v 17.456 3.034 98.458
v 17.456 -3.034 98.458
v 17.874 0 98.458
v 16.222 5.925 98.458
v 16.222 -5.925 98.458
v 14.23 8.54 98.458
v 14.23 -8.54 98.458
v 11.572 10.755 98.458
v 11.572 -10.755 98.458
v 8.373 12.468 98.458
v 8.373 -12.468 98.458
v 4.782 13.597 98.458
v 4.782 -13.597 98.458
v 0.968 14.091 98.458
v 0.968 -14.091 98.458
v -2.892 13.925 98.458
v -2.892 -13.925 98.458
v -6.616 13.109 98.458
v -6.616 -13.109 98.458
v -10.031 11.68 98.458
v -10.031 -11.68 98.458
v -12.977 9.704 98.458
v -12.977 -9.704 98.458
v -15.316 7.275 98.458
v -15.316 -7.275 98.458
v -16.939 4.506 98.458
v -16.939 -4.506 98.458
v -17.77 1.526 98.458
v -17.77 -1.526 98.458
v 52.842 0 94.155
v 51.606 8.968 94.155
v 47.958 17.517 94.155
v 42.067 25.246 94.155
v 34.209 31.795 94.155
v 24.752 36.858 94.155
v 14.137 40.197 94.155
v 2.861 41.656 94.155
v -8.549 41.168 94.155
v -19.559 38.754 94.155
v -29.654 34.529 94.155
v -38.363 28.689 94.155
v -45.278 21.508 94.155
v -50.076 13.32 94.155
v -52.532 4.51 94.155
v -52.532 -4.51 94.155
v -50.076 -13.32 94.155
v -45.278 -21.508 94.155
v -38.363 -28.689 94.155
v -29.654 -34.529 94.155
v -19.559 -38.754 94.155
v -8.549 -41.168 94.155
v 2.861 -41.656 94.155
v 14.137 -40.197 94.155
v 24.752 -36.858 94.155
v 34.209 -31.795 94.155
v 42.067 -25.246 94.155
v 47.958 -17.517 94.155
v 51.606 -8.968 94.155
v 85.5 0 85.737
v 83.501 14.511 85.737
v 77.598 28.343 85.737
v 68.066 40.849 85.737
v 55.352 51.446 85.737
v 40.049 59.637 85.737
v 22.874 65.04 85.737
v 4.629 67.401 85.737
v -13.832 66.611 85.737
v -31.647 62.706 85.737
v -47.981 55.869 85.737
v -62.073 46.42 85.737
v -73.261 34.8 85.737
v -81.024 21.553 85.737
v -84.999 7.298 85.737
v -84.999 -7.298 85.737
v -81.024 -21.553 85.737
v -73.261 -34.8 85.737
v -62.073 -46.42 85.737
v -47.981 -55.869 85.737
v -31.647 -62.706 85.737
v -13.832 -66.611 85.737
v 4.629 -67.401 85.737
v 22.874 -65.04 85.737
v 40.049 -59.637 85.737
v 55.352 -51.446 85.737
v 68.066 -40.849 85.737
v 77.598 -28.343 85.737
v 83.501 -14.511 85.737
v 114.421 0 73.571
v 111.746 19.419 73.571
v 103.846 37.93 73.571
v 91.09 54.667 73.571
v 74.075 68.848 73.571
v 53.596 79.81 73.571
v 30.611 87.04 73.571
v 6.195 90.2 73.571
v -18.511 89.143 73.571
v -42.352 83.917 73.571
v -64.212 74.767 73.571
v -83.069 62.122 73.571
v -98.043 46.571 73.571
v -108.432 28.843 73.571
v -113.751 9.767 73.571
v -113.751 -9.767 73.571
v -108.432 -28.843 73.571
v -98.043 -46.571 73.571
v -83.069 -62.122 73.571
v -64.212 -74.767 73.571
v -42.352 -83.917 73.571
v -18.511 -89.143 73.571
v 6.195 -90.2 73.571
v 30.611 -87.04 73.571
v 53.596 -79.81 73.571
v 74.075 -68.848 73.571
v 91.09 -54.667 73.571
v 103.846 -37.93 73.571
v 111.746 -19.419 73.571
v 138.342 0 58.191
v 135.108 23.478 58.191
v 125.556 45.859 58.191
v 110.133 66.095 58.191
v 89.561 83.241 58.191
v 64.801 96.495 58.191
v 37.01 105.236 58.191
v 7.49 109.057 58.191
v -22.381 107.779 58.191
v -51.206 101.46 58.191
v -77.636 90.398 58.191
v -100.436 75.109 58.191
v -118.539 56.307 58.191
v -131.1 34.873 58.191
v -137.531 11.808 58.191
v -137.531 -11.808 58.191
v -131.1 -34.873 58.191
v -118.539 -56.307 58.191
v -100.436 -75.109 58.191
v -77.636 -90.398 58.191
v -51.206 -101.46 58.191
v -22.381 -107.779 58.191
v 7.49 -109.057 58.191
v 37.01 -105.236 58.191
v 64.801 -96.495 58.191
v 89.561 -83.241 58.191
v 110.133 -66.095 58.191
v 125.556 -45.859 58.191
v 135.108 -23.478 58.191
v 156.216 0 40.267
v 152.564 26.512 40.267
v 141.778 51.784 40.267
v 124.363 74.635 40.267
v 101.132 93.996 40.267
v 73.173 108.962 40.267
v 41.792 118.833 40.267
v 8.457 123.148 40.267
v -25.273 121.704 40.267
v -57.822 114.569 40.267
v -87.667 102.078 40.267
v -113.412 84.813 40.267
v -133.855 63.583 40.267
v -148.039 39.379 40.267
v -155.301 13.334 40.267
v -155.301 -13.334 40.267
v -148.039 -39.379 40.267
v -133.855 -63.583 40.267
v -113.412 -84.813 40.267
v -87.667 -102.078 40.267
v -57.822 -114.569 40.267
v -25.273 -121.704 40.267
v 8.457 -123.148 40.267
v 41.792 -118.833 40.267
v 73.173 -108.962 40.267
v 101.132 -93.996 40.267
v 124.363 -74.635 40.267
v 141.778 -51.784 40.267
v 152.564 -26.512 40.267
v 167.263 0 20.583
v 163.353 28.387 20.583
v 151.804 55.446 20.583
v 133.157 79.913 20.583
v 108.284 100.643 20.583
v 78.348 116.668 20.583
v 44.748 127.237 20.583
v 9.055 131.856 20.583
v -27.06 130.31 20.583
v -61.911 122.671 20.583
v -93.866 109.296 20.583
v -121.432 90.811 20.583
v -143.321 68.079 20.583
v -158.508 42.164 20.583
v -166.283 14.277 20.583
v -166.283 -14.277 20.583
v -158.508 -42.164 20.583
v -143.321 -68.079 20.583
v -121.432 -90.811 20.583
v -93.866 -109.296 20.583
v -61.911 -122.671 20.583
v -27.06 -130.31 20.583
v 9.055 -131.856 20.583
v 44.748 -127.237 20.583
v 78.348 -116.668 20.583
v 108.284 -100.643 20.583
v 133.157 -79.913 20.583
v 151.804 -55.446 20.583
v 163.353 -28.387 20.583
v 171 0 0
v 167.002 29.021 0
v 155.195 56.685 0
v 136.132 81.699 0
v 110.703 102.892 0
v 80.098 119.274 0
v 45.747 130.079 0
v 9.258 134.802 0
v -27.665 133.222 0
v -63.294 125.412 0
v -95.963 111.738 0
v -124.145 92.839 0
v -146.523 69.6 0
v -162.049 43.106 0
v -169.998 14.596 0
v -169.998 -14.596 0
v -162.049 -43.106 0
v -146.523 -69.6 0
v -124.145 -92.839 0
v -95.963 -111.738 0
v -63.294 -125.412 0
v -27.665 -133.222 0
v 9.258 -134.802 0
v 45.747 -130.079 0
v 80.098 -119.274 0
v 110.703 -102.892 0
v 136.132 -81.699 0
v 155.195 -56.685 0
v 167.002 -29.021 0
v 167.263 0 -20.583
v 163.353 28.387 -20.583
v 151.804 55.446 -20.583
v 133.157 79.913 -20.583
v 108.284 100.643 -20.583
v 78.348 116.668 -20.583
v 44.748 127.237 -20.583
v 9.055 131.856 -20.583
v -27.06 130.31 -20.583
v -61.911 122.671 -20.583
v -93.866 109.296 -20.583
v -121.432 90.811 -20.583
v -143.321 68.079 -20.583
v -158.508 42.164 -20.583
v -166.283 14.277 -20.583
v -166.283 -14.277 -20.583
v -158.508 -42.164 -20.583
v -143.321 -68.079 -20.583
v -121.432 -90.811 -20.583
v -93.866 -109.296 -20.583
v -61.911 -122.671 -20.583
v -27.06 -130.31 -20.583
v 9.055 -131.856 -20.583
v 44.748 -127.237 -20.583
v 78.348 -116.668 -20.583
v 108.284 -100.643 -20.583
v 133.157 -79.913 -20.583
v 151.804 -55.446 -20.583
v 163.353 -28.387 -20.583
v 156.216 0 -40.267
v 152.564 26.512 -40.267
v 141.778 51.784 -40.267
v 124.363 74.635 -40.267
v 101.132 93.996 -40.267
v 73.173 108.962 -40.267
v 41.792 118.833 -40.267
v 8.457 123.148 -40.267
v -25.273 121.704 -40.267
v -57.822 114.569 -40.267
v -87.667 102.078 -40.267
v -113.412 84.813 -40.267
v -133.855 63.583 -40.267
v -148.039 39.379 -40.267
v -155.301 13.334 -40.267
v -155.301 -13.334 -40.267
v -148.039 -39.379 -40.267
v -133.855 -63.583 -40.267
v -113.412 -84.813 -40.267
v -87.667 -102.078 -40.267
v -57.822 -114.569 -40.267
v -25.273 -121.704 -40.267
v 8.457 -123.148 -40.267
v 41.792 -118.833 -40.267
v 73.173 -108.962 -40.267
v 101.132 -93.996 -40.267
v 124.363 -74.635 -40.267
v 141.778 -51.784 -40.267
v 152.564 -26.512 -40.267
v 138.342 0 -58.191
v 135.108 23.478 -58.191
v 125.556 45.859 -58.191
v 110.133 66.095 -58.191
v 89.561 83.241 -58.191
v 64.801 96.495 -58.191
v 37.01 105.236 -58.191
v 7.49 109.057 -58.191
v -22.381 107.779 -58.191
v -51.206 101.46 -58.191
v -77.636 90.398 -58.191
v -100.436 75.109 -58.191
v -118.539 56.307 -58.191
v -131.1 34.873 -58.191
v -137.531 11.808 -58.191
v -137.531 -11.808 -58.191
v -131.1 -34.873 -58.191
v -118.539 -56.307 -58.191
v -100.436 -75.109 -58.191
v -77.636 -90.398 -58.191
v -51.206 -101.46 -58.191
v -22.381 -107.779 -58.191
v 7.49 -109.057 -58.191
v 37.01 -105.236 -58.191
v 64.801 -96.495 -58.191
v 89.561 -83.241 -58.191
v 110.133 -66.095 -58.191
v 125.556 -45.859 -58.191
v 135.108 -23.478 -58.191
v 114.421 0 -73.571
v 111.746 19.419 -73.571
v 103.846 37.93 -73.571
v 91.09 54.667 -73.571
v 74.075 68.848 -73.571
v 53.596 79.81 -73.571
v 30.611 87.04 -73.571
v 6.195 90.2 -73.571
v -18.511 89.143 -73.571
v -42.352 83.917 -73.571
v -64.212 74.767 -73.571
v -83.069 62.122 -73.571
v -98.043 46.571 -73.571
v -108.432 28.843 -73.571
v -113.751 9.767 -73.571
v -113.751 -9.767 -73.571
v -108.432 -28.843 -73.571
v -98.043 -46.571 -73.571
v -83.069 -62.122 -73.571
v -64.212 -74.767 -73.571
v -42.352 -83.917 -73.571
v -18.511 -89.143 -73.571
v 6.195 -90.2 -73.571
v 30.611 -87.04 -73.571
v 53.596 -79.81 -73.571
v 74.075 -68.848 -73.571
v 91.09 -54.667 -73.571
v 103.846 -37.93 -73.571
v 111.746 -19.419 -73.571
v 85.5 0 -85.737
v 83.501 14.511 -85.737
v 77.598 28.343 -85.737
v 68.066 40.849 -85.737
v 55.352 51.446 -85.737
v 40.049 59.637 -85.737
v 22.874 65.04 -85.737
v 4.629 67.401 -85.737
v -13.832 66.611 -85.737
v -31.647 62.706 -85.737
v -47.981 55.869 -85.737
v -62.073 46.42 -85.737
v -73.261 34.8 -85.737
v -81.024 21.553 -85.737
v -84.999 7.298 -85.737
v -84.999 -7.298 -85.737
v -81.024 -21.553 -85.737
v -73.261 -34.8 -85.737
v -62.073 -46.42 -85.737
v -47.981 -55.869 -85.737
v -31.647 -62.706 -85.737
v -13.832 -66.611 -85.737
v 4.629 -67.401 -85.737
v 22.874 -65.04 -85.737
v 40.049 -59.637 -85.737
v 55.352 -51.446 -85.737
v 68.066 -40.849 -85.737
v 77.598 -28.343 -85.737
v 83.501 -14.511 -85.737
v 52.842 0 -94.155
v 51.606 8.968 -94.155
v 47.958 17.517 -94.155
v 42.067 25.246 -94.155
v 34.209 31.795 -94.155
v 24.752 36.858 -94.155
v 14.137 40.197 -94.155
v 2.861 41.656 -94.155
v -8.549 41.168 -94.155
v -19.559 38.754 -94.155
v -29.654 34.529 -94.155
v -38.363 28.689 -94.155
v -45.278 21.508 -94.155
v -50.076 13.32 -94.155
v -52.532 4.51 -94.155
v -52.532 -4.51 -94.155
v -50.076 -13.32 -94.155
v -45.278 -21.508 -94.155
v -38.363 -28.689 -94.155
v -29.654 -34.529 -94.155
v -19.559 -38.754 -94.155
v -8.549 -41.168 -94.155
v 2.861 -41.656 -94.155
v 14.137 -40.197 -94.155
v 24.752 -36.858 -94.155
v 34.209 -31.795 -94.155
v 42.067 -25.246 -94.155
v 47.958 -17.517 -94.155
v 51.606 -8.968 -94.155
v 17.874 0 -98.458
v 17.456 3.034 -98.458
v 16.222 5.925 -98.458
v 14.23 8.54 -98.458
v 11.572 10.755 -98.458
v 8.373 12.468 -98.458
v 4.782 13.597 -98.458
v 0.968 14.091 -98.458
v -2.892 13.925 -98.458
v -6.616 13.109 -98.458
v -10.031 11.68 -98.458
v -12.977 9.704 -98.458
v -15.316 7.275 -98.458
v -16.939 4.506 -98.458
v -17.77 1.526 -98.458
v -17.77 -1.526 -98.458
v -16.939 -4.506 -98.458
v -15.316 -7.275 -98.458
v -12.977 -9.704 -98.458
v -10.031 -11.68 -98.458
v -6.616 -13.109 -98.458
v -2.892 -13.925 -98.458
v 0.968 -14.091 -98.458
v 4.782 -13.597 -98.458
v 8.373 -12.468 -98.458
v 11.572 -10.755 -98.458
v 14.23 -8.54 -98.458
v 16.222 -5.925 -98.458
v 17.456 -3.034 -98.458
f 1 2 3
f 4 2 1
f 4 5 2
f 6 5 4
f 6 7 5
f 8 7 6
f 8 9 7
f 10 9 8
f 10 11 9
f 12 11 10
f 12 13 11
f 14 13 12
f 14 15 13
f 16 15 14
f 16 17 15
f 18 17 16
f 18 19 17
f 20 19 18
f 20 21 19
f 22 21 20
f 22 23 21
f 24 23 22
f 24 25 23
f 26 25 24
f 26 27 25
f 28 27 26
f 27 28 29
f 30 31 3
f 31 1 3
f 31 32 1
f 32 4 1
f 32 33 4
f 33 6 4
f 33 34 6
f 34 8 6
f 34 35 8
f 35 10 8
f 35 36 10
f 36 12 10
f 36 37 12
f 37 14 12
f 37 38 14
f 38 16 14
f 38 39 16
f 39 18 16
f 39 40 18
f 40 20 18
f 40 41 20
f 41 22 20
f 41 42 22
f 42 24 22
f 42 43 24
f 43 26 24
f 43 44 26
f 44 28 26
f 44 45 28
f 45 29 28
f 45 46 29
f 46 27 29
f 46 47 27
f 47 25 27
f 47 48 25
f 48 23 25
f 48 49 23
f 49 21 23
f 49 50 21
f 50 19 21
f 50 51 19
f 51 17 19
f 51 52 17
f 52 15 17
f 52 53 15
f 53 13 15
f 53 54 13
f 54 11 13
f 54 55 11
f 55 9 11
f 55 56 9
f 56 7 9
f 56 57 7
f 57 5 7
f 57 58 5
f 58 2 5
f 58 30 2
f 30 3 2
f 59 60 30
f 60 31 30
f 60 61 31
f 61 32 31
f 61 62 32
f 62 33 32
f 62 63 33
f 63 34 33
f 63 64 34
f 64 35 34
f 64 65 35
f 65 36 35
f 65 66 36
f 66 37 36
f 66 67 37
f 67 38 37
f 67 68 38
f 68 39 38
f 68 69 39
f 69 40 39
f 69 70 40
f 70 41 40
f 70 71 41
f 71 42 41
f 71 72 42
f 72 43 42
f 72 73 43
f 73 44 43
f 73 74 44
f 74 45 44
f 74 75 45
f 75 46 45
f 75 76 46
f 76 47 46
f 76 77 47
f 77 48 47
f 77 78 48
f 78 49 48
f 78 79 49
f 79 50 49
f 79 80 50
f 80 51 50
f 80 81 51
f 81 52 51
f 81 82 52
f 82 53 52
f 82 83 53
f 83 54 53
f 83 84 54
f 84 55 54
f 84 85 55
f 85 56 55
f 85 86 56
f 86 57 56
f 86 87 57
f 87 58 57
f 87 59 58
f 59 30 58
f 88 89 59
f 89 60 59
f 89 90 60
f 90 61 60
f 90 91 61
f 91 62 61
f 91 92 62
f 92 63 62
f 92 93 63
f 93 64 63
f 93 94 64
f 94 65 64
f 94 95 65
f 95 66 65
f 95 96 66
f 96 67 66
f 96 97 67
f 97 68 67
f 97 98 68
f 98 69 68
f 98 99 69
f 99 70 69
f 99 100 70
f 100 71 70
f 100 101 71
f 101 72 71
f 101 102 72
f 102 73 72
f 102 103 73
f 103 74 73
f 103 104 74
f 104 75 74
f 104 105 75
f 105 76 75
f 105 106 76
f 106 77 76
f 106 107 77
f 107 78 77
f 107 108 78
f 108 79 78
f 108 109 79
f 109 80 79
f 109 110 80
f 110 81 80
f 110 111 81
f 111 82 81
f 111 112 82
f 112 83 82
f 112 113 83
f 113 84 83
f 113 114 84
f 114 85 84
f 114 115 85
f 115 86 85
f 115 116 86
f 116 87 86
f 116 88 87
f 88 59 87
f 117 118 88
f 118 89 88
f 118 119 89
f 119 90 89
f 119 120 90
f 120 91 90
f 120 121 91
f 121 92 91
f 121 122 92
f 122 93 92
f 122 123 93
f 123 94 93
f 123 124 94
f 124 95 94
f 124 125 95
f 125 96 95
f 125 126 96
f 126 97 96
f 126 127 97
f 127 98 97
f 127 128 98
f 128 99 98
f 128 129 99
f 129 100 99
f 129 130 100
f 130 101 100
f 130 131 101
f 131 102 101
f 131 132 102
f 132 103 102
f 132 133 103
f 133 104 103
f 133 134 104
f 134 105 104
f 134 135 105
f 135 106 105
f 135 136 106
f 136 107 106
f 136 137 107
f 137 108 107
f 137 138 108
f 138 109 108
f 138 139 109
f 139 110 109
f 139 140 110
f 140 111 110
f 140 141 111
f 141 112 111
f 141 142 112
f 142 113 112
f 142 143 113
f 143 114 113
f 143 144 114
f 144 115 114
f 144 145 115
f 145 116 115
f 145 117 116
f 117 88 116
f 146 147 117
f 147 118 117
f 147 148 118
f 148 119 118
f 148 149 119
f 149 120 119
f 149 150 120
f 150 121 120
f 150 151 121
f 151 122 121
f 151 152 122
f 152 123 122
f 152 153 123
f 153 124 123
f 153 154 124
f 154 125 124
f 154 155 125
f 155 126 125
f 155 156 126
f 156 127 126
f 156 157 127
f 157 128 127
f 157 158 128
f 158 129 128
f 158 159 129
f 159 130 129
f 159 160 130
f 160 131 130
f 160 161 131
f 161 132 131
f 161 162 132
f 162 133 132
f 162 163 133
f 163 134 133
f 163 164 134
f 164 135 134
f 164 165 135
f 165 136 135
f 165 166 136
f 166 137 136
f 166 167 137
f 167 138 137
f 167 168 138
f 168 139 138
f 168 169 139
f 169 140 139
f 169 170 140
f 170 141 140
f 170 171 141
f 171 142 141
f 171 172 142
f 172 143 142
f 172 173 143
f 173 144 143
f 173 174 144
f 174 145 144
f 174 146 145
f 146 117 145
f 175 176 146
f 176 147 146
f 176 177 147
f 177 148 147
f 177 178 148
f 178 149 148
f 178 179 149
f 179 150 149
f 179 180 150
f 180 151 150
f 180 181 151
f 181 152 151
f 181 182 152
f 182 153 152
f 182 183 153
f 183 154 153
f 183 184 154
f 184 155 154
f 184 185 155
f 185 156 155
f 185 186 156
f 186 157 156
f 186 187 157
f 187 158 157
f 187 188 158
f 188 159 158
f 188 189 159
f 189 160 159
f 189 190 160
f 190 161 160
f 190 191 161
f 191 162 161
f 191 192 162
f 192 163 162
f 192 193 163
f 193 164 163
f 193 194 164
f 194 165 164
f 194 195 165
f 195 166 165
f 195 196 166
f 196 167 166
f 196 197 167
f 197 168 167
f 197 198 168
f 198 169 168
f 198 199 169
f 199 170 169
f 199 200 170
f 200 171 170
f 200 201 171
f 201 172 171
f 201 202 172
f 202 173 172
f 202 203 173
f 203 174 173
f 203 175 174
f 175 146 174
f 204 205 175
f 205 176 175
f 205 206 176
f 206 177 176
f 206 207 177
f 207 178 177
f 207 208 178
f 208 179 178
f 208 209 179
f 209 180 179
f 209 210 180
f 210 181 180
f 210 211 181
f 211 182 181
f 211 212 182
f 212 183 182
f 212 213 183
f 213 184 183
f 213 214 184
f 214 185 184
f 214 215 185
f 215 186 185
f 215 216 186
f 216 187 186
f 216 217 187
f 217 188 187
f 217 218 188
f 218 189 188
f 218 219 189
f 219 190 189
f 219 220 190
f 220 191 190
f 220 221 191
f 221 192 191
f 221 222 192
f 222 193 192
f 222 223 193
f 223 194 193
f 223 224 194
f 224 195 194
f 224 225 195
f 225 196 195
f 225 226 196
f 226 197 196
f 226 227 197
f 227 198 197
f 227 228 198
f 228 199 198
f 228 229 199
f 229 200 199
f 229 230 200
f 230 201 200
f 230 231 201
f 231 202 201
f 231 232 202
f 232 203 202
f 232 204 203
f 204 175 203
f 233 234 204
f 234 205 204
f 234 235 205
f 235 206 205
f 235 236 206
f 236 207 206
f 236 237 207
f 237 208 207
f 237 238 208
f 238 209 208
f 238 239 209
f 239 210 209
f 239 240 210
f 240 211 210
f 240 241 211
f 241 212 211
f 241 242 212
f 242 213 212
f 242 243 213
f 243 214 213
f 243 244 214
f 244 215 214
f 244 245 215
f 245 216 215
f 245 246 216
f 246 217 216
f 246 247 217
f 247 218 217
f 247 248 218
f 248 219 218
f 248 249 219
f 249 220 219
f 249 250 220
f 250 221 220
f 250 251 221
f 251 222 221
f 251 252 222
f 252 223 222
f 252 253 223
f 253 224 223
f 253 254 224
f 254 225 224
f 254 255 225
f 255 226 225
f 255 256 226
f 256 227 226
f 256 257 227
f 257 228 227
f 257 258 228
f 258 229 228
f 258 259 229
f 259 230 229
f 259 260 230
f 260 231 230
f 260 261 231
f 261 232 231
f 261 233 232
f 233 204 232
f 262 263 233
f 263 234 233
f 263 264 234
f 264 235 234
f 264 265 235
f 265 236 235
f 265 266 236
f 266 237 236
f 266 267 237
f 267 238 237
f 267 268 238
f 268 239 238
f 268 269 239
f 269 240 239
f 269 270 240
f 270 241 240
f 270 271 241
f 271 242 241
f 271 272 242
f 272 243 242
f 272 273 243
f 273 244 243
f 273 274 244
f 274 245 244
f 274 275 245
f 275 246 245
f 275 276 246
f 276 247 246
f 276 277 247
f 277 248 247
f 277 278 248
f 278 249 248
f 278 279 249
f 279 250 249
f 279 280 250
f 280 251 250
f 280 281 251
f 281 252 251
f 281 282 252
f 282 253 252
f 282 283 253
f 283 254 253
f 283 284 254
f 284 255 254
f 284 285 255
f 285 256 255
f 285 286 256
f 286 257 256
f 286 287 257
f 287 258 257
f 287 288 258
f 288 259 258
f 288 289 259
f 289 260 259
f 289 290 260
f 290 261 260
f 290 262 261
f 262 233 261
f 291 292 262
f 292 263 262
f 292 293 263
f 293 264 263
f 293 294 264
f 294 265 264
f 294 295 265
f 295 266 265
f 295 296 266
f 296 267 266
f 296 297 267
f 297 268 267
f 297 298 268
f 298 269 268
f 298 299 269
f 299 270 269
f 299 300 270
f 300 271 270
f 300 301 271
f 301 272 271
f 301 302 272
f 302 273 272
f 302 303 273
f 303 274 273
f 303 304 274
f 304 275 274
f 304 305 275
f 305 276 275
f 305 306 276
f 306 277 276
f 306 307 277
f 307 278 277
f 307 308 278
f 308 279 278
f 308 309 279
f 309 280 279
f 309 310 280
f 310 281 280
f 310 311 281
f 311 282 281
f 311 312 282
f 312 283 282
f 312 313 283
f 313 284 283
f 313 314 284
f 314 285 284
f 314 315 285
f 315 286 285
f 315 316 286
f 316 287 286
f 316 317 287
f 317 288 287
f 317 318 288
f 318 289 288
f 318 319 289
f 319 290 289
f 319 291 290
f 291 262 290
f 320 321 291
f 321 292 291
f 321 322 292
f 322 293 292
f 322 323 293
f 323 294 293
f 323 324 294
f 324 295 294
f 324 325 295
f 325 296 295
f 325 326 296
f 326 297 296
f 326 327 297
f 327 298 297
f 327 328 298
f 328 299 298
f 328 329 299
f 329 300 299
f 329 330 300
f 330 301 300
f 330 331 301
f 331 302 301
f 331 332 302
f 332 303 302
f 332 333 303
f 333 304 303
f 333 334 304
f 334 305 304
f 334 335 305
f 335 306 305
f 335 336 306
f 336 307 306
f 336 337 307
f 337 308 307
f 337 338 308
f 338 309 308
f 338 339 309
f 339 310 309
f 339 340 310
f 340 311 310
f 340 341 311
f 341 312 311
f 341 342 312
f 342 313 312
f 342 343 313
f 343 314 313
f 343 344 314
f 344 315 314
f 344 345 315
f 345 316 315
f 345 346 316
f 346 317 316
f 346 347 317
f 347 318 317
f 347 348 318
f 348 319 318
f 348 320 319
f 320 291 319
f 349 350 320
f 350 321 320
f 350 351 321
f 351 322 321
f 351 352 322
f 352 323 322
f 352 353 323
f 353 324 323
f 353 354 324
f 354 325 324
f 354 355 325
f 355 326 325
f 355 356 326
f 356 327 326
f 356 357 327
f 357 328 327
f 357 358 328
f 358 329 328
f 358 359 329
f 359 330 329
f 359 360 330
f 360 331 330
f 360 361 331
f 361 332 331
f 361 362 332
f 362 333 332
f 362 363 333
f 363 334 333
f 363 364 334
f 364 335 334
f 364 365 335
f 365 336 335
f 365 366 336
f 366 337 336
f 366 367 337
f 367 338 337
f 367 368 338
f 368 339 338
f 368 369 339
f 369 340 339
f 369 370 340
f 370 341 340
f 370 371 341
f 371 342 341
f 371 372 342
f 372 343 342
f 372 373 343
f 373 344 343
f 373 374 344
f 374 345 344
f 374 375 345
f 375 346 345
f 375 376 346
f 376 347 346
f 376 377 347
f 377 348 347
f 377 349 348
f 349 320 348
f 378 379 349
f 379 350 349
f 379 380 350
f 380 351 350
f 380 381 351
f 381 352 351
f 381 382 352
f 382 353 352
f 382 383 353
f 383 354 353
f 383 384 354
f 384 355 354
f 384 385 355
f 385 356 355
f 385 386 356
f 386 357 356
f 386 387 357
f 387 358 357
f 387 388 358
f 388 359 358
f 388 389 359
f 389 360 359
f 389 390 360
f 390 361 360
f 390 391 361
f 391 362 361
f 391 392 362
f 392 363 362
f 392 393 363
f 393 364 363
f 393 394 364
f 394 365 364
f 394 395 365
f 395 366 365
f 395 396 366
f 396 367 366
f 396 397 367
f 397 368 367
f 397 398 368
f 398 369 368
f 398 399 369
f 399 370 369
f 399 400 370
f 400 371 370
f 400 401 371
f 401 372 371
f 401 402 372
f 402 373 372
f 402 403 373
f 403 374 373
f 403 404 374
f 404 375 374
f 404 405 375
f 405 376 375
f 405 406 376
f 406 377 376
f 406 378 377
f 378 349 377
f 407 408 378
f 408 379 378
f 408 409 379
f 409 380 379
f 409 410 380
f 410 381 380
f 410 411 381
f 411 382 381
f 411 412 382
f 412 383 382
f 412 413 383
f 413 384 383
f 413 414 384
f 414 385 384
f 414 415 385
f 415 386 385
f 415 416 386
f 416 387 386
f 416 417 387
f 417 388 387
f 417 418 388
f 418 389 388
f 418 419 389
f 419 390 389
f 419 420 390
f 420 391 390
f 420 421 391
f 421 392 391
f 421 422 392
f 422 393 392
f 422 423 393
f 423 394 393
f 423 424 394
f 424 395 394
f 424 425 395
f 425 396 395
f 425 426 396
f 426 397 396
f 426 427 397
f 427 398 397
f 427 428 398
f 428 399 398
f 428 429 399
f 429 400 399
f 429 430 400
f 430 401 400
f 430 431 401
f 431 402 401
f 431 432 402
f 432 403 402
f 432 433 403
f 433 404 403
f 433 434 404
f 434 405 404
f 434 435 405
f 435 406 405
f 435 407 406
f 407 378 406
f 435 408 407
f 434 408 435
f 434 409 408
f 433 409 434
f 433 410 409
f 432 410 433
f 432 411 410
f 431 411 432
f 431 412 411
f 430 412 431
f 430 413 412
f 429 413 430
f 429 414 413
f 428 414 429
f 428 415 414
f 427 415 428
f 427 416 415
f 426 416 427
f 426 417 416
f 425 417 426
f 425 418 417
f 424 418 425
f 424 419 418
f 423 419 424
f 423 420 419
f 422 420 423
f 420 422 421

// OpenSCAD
// Generated by SolidPython 1.0.1 on 2020-07-29 00:46:54


scale(v = [19, 15, 11]) {
	sphere(r = 9);
}
/***********************************************
*********      SolidPython code:      **********
************************************************
 
# import packages: SolidPython
from solid import *
from solid.utils import *
from itertools import chain, combinations, permutations


class Resize:

    def __init__(self, scad_file):
        self.scad_file = scad_file
        #self.scad_file = import_scad(scad_file)
        # cone/cylinder param:
        self.r1 = 0
        self.r2 = 0
        self.h = 0
        # rectangular prism param:
        self.w = 0
        self.l = 0
        # ellipse param:
        self.r = 0

    # import OpenScad code (file name corresponds to shape)


    # classify shape + parameters
    def assign(self, param1, param2, param3):
        if self.scad_file == 'cone.scad':
            self.r1 = param1
            self.r2 = param2
            self.h = param3
        elif self.scad_file == 'cylinder.scad':
            self.r1 = param1
            self.r2 = param2
            self.h = param3
        elif self.scad_file == 'rectangularPrism.scad':
            self.h = param1
            self.l = param2
            self.w = param3
        else:
            self.r = param1
            self.h = param2

    # resize parameters
    def iterate(self):
        x = range(3, 20, 2)
        i = 1
        if self.scad_file == 'cone.scad':
            tempList = list(permutations(x, 2))
            for temp in tempList:
                param1 = temp[0]
                param2 = temp[1]
                filepath = 'produced_scad_files/' + 'cone' + str(param1) + '_' + str(param2) + '_' + '.scad'
                scad_render_to_file(cylinder(h=param1, r1=param2, r2=0), filepath)

        elif self.scad_file == 'cylinder.scad':
            tempList = list(permutations(x, 3))
            for temp in tempList:
                param1 = temp[0]
                param2 = temp[1]
                filepath = 'produced_scad_files/' + 'cylinder' + str(param1) + '_' + str(param2) + '_' + '.scad'
                scad_render_to_file(cylinder(h=param1, r1=param2, r2=param2), filepath)

        elif self.scad_file == 'rectangularPrism.scad':
            tempList = list(permutations(x, 3))
            for temp in tempList:
                param1 = temp[0]
                param2 = temp[1]
                param3 = temp[2]
                filepath = 'produced_scad_files/' + 'rectangularPrism' + str(param1) + '_' + str(param2) + '_' + str(
                    param3) + '.scad'
                scad_render_to_file(cube(size=(param1, param2, param3)), filepath)

        elif self.scad_file == 'ellipse.scad':
            tempList = list(permutations(x, 4))
            for temp in tempList:
                param1 = temp[0]
                param2 = temp[1]
                param3 = temp[2]
                param4 = temp[3]
                filepath = 'produced_scad_files/' + 'ellipse' + str(param1) + '_' + str(param2) + '_' + str(param3) + '_' + str(param4) + '.scad'
                scad_render_to_file(scale([param1, param2, param3])(sphere(r=param4)), filepath)

    def render_to_scadfile(self):
        scad_render_to_file(scad, 'example.scad') 
 
************************************************/
